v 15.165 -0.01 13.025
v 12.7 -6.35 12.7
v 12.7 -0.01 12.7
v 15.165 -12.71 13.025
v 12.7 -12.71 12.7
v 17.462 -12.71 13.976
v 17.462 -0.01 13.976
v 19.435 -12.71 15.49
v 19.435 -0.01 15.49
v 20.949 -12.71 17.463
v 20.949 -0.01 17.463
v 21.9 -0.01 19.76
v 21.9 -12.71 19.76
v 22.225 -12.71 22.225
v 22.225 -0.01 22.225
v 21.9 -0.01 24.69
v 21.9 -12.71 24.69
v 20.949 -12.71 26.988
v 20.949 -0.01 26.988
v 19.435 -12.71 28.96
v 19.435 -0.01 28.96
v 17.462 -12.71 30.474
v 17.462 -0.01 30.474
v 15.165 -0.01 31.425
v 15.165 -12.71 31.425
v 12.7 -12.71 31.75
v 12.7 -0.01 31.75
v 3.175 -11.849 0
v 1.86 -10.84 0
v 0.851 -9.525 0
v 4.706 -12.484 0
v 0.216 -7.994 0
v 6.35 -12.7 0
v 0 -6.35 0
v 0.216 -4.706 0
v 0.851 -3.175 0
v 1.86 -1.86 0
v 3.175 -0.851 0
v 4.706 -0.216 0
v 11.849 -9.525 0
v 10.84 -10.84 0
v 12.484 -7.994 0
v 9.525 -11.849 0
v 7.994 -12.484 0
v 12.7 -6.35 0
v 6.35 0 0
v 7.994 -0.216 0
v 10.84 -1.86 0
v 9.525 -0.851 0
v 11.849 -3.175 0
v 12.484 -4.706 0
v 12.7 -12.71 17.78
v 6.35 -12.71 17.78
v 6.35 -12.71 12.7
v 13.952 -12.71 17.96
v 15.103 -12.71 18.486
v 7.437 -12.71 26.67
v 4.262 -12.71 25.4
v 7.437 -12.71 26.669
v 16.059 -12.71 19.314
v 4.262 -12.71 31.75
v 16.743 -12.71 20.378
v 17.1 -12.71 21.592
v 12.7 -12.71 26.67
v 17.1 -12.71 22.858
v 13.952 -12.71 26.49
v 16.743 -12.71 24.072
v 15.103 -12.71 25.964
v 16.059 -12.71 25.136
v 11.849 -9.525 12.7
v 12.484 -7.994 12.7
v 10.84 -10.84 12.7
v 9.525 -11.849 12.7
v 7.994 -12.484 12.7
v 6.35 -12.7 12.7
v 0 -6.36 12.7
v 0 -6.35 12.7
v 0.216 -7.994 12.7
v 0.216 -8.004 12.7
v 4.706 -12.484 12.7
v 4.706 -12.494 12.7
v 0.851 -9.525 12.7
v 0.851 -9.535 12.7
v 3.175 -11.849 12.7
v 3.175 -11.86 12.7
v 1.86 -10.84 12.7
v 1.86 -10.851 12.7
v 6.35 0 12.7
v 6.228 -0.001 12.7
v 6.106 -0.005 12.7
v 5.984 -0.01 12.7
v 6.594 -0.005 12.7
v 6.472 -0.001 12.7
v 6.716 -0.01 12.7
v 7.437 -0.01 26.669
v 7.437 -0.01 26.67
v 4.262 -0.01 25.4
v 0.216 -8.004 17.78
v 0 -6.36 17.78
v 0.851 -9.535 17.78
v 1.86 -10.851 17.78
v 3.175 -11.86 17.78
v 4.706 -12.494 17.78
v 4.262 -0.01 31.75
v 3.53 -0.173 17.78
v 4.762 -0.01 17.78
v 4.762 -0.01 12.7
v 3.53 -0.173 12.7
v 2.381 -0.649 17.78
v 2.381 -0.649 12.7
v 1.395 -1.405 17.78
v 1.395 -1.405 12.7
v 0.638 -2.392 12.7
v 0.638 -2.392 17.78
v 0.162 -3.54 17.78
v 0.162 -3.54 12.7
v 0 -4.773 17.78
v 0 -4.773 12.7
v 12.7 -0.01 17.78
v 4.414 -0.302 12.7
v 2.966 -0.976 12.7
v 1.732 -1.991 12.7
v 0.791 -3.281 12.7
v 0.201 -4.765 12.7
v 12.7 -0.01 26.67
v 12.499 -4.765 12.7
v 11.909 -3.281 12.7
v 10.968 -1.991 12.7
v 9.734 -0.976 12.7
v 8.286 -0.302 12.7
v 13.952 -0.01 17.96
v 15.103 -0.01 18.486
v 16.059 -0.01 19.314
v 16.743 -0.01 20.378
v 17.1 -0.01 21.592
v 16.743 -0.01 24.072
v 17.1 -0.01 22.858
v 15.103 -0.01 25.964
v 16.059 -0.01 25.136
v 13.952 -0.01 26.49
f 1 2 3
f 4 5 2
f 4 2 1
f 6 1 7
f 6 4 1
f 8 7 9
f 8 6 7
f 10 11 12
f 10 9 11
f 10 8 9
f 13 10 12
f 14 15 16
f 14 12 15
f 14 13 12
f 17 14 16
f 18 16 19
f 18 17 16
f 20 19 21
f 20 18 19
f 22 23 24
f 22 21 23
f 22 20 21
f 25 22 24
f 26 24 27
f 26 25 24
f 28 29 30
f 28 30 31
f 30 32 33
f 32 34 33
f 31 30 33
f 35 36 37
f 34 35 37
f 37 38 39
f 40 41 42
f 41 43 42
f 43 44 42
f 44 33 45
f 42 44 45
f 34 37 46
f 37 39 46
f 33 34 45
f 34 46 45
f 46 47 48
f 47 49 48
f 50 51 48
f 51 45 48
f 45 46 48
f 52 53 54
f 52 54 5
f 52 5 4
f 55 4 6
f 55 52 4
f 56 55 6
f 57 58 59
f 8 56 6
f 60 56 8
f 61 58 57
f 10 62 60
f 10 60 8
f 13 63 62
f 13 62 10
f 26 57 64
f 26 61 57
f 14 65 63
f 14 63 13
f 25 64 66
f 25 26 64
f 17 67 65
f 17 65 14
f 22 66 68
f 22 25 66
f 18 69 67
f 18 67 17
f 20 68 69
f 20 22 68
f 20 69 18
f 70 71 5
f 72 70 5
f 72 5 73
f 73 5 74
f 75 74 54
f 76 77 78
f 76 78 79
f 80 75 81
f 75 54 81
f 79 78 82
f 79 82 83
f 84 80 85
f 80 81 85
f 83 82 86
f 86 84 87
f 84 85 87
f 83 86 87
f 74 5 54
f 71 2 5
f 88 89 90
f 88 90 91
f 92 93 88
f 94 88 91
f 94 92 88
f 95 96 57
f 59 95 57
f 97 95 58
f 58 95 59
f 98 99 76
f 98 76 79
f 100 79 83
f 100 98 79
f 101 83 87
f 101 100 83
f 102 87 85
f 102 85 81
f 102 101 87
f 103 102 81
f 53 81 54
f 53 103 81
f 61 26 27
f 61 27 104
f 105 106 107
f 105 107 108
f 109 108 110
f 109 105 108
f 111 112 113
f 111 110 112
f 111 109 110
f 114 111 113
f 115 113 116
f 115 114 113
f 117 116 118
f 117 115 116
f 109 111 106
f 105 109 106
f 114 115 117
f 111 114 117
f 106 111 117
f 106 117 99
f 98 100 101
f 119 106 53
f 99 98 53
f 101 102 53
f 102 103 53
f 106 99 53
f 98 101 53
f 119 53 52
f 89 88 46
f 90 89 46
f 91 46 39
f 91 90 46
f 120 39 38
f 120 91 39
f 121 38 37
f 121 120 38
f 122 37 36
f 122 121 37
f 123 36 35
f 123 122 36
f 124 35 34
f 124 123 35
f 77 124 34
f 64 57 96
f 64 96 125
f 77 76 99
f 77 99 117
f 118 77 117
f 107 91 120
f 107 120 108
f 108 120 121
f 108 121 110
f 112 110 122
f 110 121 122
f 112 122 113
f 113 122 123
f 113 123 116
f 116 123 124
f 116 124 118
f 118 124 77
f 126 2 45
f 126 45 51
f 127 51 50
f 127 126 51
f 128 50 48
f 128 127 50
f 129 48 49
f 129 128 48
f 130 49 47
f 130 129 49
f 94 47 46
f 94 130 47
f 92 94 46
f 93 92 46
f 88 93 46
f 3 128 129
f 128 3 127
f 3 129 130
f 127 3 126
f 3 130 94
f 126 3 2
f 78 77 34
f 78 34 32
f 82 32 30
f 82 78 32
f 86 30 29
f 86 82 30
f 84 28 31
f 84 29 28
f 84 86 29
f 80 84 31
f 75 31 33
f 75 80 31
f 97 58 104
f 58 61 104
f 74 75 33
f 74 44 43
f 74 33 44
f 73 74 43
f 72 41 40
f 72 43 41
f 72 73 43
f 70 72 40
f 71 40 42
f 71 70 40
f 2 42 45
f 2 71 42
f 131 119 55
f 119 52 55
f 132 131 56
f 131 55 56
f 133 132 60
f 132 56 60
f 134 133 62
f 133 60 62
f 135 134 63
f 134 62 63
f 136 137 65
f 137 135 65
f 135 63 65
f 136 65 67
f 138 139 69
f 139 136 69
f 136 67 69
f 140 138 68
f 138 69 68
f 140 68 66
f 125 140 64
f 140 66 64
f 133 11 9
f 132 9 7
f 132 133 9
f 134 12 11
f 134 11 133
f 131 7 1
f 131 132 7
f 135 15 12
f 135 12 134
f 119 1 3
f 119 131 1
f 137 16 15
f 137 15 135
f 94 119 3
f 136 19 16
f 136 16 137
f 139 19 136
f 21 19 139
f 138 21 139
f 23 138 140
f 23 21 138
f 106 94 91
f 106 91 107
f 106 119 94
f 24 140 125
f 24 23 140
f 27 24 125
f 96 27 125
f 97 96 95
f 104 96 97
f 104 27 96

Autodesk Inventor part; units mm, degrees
ref_plane "YZ Plane" through (0, 0, 0) normal (1, 0, 0) x (0, 1, 0)
ref_plane "XZ Plane" through (0, 0, 0) normal (0, 1, 0) x (-1, 0, 0)
ref_plane "XY Plane" through (0, 0, 0) normal (0, 0, 1) x (1, 0, 0)
sketch "Sketch1" plane through (0, 0, 0) normal (0, 0, 1) x (1, 0, 0)
  line L0 (0, 0) -> (12.7, 0)
  line L1 (12.7, 0) -> (12.7, -12.7)
  line L2 (12.7, -12.7) -> (0, -12.7)
  line L3 (0, -12.7) -> (0, 0)
  point P0 (6.35, -12.7)
  point P1 (6.35, 0)
  dimension "d0" = 12.7
  dimension "d1" = 12.7
extrude "Extrusion1" add sketch "Sketch1" along normal blind 12.7
fillet "Fillet1" radius 6.35 4 edges at (12.7, 0, 6.35) (0, 0, 6.35) (0, -12.7, 6.35) (12.7, -12.7, 6.35)
sketch "Sketch2" plane through (6.35, -6.35, 12.7) normal (0, 0, 1) x (1, 0, 0)
  line L0 (-2.0483, -0.0105) -> (1.7617, -0.0105)
  line L1 (1.7617, -0.0105) -> (1.7617, -0.03)
  line L2 (1.7617, -0.03) -> (-2.0483, -0.03)
  line L3 (-2.0483, -0.03) -> (-2.0483, -0.0105)
  point P0 (-6.35, 6.35)
extrude "Extrusion2" add sketch "Sketch2" along normal blind 2.54
sketch "Sketch4" plane through (4.3017, -6.3605, 12.7) normal (0, 1, 0) x (1, 0, 0)
  line L0 (8.3983, 0) -> (-4.3017, 0) projected
  arc A0 (8.3983, -19.05) -> (8.3983, 0) centre (8.3983, -9.525) ccw
  line L1 (8.3983, -19.05) -> (-0.04, -19.05)
  line L2 (-0.04, -19.05) -> (-0.04, -13.97)
  line L3 (-0.04, -13.97) -> (8.3983, -13.97)
  line L4 (-4.3017, 0) -> (-4.3017, -5.08)
  line L5 (-4.3017, -5.08) -> (8.3983, -5.08)
  arc A1 (8.3983, -13.97) -> (8.3983, -5.08) centre (8.3983, -9.525) ccw
  point P0 (-4.3017, 12.7)
  dimension "d10" = 19.05
  dimension "d11" = 5.08
  dimension "d12" = 5.08
extrude "Extrusion3" add sketch "Sketch4" along normal mid plane 12.7
fillet "Fillet2" radius 6.35 1 edges at (0, -12.7105, 15.24)
fillet "Fillet3" radius 4.7625 1 edges at (0, -0.0105, 15.24)
sketch "Sketch5" plane through (12.7, -0.0105, 26.67) normal (0, 0, -1) x (-1, 0, 0)
  line L0 (0, 0) -> (8.4383, 0) projected
  line L1 (8.4383, -12.7) -> (0, -12.7) projected
  line L2 (8.4383, 0) -> (5.2633, 0)
  line L3 (5.2633, 0) -> (5.2633, -12.7)
  line L4 (5.2633, -12.7) -> (8.4383, -12.7)
  line L5 (8.4383, -12.7) -> (8.4383, 0)
  point P0 (12.7, 0.0105)
  point P1 (5.2633, 0)
  dimension "d17" = 3.175
extrude "Extrusion4" add sketch "Sketch5" along normal blind 1.27
chamfer "Chamfer1" distance 3.175 angle 21.8 1 edges at (7.4367, -6.3605, 25.4) measured on face at (6.3784, -4.2438, 25.4)
properties part number "Hitch to the Polar Express [Copy]"
